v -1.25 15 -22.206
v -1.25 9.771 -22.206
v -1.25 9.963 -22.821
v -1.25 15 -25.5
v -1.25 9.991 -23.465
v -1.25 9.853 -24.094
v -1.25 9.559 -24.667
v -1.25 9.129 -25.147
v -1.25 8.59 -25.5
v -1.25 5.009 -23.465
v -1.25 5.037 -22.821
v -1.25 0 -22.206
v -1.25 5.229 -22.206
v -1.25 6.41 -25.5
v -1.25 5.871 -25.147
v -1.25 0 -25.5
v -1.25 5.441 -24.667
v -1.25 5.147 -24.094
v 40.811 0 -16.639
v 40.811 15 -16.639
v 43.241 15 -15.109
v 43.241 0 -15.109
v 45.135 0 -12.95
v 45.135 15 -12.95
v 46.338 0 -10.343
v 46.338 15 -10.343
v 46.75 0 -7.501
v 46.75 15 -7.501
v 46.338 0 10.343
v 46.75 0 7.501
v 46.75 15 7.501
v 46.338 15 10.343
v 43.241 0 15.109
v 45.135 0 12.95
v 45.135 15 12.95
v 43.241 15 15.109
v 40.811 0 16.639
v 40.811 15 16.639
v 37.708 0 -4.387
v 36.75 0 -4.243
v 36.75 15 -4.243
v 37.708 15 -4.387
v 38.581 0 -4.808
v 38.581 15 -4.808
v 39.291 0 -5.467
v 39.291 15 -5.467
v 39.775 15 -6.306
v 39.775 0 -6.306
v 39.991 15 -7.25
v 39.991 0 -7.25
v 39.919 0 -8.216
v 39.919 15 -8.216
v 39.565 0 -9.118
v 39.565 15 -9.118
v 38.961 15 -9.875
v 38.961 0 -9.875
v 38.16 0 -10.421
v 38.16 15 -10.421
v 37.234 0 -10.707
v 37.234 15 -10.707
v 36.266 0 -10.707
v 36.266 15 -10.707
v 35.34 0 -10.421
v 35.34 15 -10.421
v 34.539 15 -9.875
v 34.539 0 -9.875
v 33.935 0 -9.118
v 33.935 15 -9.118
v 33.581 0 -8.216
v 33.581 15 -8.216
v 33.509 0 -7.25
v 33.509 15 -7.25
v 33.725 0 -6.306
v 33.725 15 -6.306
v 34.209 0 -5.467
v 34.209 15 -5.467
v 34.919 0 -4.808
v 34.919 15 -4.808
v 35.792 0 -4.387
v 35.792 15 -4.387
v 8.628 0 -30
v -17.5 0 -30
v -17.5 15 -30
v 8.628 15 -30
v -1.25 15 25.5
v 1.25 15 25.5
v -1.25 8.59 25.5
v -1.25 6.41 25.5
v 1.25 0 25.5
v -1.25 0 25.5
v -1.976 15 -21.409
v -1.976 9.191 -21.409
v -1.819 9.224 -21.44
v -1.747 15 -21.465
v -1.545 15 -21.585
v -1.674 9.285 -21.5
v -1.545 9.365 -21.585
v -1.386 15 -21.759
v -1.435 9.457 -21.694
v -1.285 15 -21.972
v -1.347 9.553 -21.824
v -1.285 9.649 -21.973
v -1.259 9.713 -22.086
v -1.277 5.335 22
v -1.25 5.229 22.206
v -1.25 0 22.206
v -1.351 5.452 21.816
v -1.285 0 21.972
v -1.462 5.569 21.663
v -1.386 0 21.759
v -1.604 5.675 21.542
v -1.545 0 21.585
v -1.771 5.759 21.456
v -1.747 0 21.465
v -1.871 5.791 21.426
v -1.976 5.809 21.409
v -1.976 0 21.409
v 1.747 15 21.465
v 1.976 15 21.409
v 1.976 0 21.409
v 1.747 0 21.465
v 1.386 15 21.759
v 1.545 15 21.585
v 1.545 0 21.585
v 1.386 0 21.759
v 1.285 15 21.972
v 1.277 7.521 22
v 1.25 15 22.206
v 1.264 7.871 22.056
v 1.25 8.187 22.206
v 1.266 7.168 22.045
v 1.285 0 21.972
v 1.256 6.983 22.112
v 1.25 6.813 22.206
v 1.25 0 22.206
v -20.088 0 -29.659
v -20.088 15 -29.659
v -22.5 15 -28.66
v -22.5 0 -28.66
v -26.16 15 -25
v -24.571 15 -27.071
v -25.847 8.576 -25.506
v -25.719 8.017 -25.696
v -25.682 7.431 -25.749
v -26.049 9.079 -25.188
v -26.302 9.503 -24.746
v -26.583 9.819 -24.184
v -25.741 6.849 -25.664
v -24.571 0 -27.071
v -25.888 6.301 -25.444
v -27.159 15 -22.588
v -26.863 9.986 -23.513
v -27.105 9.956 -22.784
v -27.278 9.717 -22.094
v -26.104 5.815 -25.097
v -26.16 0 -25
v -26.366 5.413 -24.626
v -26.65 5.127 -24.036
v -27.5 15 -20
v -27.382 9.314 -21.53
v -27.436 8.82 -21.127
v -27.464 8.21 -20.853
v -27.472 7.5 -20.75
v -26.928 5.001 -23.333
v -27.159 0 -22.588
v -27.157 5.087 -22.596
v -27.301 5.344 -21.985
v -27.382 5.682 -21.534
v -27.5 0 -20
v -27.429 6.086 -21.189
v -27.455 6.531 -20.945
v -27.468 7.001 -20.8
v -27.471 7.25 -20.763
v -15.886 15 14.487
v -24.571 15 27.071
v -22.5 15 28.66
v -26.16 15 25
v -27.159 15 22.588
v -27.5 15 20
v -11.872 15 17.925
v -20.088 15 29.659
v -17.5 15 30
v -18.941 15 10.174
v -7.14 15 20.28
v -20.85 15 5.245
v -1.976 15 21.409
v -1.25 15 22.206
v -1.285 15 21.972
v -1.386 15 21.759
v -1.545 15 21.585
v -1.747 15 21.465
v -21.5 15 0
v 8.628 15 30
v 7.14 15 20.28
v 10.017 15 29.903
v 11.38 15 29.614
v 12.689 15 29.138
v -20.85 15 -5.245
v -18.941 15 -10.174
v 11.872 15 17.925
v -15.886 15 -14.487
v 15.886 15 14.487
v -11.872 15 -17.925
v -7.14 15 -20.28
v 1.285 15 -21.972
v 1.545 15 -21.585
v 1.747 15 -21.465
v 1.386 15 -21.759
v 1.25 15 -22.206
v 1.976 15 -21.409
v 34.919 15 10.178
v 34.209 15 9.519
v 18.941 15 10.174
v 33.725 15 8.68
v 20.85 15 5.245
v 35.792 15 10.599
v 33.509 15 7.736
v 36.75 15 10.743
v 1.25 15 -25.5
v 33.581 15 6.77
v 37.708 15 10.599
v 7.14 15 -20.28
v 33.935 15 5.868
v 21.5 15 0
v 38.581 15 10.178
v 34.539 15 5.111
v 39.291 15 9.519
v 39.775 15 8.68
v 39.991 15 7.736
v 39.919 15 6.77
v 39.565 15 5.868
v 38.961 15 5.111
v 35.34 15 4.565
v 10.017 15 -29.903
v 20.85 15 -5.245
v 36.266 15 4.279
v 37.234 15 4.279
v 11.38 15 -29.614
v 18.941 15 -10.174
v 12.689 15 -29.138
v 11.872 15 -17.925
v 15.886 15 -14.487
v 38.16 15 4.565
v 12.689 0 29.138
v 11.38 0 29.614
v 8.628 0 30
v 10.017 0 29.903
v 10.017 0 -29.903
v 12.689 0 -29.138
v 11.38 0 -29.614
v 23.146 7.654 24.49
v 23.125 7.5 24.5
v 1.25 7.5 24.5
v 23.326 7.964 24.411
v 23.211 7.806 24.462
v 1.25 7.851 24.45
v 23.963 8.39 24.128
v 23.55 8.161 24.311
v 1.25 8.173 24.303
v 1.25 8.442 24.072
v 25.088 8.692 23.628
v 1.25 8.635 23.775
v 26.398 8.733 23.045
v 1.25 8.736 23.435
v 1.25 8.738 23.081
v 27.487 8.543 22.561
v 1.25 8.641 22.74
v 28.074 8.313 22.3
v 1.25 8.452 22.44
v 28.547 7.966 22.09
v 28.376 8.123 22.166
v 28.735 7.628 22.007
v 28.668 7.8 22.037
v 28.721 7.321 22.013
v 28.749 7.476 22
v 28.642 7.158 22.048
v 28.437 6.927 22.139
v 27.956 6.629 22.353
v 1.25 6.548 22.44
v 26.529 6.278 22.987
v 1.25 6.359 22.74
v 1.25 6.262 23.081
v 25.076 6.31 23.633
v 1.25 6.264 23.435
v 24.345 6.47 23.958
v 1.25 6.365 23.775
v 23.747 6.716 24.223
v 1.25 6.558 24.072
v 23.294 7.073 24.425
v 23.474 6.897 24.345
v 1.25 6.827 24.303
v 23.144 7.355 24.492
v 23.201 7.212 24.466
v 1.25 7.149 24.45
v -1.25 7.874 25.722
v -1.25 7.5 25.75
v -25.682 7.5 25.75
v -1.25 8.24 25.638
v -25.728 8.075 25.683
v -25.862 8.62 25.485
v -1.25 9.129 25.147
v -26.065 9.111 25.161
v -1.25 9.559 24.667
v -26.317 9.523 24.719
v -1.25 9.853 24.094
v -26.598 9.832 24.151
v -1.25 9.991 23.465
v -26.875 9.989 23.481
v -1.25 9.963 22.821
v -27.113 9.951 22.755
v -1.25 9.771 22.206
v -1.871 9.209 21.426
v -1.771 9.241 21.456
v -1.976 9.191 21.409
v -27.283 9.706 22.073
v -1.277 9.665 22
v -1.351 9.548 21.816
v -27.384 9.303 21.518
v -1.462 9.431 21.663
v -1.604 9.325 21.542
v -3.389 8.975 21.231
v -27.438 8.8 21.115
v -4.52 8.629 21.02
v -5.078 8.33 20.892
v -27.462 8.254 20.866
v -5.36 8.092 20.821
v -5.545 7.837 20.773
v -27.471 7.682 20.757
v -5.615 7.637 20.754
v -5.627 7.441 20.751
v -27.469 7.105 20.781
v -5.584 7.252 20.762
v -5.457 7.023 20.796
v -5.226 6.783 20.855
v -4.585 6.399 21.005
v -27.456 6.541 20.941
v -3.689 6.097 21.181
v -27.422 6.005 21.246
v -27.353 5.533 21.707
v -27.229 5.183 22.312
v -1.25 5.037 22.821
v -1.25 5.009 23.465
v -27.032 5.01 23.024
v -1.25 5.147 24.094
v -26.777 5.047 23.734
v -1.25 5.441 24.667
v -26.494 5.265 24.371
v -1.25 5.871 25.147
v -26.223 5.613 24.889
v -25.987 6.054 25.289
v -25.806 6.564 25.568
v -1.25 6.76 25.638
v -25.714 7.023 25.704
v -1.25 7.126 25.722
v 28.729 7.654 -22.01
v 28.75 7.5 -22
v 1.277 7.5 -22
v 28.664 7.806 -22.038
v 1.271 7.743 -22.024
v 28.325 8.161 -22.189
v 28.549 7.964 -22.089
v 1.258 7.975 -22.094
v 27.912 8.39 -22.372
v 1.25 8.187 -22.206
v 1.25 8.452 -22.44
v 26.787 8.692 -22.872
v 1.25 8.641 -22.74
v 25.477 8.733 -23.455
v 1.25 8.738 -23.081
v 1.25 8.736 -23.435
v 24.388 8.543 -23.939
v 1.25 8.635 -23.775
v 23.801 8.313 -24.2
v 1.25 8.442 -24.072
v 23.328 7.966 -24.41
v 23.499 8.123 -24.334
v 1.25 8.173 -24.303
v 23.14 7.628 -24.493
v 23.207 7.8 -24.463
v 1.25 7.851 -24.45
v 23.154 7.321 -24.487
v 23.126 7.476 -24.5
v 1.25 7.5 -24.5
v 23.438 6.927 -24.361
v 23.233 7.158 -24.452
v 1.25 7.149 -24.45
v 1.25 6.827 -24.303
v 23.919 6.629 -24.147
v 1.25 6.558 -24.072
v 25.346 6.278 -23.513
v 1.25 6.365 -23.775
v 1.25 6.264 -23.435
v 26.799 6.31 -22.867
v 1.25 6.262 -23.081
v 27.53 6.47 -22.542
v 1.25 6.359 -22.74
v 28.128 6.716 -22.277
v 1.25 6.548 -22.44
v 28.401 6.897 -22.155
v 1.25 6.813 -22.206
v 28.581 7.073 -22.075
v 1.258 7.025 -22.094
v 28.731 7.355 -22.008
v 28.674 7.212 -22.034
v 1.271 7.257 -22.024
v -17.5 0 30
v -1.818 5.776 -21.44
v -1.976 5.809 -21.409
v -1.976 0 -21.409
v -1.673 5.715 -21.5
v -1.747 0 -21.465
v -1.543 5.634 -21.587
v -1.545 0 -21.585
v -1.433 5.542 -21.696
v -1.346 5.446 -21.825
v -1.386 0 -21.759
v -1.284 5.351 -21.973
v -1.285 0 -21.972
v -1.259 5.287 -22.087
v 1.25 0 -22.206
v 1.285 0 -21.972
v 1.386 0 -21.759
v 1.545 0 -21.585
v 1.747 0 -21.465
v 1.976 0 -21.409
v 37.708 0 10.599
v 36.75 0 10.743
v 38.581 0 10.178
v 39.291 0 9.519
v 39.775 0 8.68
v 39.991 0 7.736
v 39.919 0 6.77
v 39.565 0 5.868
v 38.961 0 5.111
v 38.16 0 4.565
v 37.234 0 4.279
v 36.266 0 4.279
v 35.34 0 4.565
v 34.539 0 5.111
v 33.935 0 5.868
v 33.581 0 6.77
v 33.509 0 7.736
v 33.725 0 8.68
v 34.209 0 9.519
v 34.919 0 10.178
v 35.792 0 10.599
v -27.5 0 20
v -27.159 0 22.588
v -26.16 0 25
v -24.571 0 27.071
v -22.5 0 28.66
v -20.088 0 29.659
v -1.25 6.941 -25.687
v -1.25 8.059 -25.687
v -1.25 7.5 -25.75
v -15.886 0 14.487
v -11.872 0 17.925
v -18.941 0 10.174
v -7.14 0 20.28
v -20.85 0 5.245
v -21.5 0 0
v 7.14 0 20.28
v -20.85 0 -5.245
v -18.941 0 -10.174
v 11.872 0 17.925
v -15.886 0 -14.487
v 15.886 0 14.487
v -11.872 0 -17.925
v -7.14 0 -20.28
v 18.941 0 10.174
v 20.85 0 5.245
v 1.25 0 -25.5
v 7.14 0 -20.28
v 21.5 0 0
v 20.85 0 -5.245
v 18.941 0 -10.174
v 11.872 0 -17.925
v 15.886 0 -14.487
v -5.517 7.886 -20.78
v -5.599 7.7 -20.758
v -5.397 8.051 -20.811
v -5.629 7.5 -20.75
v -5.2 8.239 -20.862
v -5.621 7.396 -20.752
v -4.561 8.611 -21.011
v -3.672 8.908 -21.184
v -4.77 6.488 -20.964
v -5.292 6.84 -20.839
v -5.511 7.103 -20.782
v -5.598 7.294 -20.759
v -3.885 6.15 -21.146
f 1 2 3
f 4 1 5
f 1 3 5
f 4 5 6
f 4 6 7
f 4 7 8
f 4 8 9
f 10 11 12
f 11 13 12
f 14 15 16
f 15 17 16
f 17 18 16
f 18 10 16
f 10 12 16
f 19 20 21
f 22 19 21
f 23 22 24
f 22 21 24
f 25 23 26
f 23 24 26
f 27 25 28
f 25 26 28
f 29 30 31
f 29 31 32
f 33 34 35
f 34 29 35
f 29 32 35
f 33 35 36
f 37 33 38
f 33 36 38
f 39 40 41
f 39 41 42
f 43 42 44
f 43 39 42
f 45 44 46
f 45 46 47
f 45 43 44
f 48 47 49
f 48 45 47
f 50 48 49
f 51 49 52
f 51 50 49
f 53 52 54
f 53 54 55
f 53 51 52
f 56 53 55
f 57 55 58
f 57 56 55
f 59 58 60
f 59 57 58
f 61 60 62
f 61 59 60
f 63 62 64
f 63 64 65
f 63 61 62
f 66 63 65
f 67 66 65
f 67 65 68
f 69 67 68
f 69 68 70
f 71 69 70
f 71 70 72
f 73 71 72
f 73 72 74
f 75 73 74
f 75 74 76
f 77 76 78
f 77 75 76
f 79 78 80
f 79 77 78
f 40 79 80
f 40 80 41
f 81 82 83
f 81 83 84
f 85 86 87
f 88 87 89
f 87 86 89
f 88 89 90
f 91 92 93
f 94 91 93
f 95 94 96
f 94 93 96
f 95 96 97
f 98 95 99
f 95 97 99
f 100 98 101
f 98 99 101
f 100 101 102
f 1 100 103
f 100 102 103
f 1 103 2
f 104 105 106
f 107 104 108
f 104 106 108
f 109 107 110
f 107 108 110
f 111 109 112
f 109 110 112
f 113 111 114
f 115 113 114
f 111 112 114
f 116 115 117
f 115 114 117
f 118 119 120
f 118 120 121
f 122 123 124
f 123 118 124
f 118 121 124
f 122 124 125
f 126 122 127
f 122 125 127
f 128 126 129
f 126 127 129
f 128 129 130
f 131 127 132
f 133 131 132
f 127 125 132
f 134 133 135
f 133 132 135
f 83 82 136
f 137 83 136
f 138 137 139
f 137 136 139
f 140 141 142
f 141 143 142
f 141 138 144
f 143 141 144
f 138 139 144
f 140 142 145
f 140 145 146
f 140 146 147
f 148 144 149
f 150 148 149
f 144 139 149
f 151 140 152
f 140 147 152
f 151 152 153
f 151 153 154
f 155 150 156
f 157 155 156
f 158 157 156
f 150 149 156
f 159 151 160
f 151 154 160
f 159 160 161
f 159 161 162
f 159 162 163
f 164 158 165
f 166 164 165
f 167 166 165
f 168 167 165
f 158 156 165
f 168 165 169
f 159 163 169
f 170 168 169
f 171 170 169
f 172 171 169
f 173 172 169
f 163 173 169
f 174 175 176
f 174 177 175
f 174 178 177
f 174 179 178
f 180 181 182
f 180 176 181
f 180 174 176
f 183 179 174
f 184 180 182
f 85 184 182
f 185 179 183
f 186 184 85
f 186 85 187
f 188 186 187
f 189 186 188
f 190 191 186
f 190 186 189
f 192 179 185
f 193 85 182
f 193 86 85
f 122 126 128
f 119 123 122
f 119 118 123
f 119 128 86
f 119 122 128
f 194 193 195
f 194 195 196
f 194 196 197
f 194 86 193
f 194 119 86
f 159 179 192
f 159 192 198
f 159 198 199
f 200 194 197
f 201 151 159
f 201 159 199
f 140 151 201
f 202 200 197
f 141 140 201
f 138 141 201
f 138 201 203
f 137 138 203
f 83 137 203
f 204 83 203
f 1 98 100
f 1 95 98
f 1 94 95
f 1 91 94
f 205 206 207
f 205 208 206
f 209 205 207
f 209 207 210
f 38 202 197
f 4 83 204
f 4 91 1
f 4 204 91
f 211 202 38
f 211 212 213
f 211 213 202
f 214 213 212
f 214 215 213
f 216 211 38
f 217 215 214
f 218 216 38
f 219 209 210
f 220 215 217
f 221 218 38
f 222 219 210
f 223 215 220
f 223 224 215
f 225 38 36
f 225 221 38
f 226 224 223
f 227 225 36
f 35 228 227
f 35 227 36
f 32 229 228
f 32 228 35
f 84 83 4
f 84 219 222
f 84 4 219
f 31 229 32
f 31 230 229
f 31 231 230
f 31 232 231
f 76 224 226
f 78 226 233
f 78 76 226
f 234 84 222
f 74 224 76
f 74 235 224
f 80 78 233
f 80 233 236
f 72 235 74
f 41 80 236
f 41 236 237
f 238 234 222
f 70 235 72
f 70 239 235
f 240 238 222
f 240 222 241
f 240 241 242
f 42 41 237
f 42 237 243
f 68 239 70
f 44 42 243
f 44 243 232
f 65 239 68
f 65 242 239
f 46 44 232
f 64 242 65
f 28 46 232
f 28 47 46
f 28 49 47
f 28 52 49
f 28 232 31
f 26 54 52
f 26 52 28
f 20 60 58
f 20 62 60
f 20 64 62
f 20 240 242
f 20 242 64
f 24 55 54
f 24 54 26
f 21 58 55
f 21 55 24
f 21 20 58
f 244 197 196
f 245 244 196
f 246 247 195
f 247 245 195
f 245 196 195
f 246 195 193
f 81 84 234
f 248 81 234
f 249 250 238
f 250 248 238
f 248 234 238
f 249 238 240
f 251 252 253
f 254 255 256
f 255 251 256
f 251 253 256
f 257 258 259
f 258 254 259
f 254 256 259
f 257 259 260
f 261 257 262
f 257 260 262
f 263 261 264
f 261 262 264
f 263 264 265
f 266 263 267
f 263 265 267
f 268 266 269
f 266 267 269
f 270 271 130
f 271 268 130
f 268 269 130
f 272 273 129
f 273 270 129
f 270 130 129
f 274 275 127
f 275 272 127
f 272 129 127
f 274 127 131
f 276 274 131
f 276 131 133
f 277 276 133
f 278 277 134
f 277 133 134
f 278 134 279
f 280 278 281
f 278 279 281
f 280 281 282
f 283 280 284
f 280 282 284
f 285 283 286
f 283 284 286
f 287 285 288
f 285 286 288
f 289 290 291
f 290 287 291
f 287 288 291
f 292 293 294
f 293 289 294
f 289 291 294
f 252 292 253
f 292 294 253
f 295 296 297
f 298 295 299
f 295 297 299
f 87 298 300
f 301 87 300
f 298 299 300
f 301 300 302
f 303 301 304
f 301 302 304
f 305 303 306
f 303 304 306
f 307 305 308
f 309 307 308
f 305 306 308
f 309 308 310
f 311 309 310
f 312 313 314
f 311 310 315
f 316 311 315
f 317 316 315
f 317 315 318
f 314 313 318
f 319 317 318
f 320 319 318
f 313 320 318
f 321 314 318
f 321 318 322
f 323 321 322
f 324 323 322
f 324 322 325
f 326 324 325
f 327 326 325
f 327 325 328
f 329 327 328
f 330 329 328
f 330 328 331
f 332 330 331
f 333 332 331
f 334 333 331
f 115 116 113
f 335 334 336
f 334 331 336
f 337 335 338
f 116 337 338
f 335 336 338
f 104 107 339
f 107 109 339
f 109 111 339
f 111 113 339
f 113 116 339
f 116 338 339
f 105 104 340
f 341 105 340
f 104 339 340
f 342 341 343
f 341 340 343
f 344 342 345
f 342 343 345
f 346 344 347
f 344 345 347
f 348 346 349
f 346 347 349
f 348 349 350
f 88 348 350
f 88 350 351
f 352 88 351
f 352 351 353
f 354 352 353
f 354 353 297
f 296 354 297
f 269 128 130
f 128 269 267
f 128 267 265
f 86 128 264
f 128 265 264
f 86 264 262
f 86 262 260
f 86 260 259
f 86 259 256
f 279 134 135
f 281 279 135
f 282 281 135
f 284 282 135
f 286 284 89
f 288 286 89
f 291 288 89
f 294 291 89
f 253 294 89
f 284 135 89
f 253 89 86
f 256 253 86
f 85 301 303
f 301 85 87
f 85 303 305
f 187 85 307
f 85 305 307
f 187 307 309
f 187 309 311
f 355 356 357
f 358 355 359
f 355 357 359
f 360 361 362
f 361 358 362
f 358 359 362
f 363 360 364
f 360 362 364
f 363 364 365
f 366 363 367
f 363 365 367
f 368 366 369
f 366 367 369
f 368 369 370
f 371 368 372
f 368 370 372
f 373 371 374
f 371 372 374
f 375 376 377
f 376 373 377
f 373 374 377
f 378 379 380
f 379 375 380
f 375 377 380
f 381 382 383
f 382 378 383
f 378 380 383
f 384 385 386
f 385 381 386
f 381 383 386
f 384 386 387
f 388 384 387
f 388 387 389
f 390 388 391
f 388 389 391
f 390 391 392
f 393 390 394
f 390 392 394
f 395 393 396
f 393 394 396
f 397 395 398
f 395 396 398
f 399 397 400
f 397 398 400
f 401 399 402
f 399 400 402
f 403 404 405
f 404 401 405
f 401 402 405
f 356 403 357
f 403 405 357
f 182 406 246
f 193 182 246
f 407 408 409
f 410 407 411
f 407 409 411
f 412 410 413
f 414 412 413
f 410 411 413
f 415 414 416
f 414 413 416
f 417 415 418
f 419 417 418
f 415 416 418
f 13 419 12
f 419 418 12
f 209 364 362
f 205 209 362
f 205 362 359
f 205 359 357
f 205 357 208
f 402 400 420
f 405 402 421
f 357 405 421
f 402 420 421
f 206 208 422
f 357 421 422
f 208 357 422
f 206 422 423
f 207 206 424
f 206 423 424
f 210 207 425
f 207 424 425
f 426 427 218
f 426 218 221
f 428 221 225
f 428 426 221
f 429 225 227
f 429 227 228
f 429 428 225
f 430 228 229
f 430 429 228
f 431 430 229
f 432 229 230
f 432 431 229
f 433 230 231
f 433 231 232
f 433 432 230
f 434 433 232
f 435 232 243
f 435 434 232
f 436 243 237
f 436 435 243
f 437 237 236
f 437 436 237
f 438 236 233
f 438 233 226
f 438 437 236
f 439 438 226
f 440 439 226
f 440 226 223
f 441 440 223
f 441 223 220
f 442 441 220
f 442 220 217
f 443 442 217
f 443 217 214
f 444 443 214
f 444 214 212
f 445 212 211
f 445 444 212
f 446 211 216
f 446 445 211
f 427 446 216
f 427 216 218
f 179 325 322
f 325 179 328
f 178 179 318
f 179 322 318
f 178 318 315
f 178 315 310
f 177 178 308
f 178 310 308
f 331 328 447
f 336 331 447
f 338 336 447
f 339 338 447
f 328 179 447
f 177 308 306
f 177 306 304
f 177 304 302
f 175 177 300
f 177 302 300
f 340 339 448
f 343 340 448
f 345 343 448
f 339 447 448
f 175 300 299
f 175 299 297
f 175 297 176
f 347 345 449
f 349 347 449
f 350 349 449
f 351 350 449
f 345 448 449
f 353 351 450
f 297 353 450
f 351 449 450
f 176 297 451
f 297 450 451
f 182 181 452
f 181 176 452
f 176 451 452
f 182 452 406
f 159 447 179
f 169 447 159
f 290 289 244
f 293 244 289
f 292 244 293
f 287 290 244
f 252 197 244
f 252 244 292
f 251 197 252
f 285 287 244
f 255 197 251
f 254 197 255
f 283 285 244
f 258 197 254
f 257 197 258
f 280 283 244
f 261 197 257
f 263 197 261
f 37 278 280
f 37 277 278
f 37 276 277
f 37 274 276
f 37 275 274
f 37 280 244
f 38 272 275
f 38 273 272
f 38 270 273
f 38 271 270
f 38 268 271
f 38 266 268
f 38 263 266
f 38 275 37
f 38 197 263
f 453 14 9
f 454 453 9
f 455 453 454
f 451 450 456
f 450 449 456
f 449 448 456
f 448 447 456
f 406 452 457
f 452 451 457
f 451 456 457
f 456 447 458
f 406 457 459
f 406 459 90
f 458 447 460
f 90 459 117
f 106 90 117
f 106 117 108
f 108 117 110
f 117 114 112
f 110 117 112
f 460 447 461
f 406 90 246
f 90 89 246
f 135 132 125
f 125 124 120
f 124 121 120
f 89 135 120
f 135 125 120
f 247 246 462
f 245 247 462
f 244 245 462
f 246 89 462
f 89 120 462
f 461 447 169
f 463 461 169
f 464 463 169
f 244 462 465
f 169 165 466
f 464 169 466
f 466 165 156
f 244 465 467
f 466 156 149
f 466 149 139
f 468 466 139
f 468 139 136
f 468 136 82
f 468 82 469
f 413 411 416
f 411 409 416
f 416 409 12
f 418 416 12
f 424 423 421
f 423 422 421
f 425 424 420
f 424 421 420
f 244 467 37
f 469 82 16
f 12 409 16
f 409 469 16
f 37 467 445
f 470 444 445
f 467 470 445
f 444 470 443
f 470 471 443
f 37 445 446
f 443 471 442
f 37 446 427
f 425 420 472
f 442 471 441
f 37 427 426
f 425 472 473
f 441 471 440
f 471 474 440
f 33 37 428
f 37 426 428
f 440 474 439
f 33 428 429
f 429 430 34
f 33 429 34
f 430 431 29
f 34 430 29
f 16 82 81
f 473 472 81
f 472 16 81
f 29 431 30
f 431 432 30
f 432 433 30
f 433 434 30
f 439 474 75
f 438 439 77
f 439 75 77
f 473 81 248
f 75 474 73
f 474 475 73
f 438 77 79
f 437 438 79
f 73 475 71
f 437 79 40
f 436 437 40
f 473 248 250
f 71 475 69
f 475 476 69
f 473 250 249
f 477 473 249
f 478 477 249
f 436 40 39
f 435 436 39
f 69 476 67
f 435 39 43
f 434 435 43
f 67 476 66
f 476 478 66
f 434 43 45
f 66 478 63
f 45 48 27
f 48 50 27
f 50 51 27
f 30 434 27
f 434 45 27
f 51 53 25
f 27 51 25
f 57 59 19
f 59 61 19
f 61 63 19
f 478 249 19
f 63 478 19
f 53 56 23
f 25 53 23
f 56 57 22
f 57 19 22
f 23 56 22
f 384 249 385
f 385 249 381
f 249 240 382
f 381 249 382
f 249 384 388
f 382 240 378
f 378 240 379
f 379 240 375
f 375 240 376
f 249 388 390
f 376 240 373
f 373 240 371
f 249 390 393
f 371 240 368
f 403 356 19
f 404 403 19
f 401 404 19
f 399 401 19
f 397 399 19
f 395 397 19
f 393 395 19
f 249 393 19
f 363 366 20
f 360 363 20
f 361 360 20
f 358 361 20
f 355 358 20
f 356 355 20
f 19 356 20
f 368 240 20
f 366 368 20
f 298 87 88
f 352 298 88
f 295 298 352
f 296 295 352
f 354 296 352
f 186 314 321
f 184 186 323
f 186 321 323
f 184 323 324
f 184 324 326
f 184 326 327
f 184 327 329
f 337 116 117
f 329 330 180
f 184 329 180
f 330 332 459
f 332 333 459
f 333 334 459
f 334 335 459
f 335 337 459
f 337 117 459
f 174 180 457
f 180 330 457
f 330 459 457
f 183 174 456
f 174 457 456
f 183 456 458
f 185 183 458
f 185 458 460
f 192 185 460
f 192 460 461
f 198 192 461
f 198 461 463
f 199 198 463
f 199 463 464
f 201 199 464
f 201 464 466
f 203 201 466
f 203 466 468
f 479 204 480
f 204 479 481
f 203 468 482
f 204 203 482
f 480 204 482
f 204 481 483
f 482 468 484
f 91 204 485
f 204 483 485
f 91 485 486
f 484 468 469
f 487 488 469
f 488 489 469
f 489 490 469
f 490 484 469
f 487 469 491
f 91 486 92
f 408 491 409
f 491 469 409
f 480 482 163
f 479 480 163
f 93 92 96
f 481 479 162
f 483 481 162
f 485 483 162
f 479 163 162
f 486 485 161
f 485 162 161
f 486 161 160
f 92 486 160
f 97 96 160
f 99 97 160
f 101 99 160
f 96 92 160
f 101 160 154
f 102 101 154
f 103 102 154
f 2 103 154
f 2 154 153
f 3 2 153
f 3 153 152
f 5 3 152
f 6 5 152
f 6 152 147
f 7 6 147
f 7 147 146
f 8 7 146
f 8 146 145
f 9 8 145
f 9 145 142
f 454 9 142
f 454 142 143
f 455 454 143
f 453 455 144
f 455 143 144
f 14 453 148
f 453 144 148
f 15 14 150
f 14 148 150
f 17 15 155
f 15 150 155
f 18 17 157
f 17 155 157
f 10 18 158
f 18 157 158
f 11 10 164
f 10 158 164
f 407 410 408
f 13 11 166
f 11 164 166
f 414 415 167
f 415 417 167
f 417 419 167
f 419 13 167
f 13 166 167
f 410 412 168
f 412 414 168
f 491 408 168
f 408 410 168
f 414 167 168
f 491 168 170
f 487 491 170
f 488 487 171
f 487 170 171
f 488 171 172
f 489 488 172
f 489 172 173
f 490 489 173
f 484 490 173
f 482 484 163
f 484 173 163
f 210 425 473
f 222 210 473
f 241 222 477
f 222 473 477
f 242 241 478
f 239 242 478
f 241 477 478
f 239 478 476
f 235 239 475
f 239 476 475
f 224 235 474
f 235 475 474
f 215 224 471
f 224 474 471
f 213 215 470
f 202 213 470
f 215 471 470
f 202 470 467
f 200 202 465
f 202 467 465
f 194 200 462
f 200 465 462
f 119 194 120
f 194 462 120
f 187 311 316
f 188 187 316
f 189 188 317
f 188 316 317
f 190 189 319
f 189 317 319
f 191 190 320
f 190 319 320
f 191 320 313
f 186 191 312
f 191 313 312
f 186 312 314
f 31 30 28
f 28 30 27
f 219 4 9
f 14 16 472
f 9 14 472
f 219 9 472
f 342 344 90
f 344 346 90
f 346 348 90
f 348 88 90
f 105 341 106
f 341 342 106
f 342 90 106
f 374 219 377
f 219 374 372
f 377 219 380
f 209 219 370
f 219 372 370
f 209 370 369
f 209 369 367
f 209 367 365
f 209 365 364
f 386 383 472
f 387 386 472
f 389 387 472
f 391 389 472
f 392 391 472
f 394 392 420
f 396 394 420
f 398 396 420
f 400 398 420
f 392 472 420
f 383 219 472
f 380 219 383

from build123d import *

# Parameters (mm, degrees)
SKETCH1_W           = 74.25
SKETCH1_H           = 60
SKETCH1_R           = 3.25
BOSS_EXTRUDE1_DEPTH = 15
SKETCH2_R           = 1.25
CUT_EXTRUDE1_DEPTH  = 82.474305766
CUT_EXTRUDE2_REACH  = 83.474
SKETCH3_R           = 2.5
CUT_EXTRUDE3_DEPTH  = 58.537487806
FILLET1_R           = 10
FILLET2_R           = 0.8


with BuildPart() as part:
    # Sketch1 → Boss-Extrude1 (new body)
    with BuildSketch(Plane(origin=(0, 0, 0), x_dir=(1, 0, 0), z_dir=(0, 1, 0))):
        with Locations((9.625, 0)):
            Rectangle(SKETCH1_W, SKETCH1_H)
        with Locations(Location((36.75, 7.493, 0), (0, 0, 270))):
            Circle(SKETCH1_R, mode=Mode.SUBTRACT)
        with Locations(Location((36.75, -7.493, 0), (0, 0, 270))):
            Circle(SKETCH1_R, mode=Mode.SUBTRACT)
        with BuildLine():
            Line((-1.25, 21.463632032), (-1.25, 25.5))
            Line((-1.25, 25.5), (1.25, 25.5))
            Line((1.25, 25.5), (1.25, 21.463632032))
            ThreePointArc((1.25, 21.463632032), (21.5, 0), (1.25, -21.463632032))
            Line((1.25, -21.463632032), (1.25, -25.5))
            Line((1.25, -25.5), (-1.25, -25.5))
            Line((-1.25, -25.5), (-1.25, -21.463632032))
            ThreePointArc((-1.25, -21.463632032), (-21.5, 0), (-1.25, 21.463632032))
        make_face(mode=Mode.SUBTRACT)
    extrude(amount=BOSS_EXTRUDE1_DEPTH)

    # Sketch2 → Cut-Extrude1 (cut, through all)
    with BuildSketch(Plane.ZY.offset(27.5)):
        with Locations((-23.25, 7.5)):
            Circle(SKETCH2_R)
        with Locations((23.25, 7.5)):
            Circle(SKETCH2_R)
    extrude(amount=-CUT_EXTRUDE1_DEPTH, mode=Mode.SUBTRACT)

    # Cut-Extrude2: up to this face of the body (flat: up to its plane)
    cut_extrude2_end = Plane(part.part.faces().sort_by_distance((-1.25, 7.5, -21.618967883))[0])
    # Sketch3 → Cut-Extrude2 (cut, up to the picked face)
    with BuildSketch(Plane.ZY.offset(27.5), mode=Mode.PRIVATE) as cut_extrude2_sk1:
        with Locations((-23.25, 7.5)):
            Circle(SKETCH3_R)
    cut_extrude2_tool1 = split(extrude(cut_extrude2_sk1.sketch, amount=-CUT_EXTRUDE2_REACH, mode=Mode.PRIVATE), bisect_by=cut_extrude2_end, keep=Keep.BOTH, mode=Mode.PRIVATE)
    # Sketch3 → Cut-Extrude2 (cut, up to the picked face)
    with BuildSketch(Plane.ZY.offset(27.5), mode=Mode.PRIVATE) as cut_extrude2_sk2:
        with Locations((23.25, 7.5)):
            Circle(SKETCH3_R)
    cut_extrude2_tool2 = split(extrude(cut_extrude2_sk2.sketch, amount=-CUT_EXTRUDE2_REACH, mode=Mode.PRIVATE), bisect_by=cut_extrude2_end, keep=Keep.BOTH, mode=Mode.PRIVATE)
    add(cut_extrude2_tool1.solids().sort_by(Axis((-27.5, 7.5, -23.25), (1, 0, 0)))[0], mode=Mode.SUBTRACT)
    add(cut_extrude2_tool2.solids().sort_by(Axis((-27.5, 7.5, 23.25), (1, 0, 0)))[0], mode=Mode.SUBTRACT)

    # Sketch4 → Cut-Extrude3 (cut, through all)
    with BuildSketch(Plane(origin=(0, 15, 0), x_dir=(1, 0, 0), z_dir=(0, 1, 0))):
        Polygon((10.75, -30), (46.75, -14), (46.75, -30), align=None)
    cut_extrude3 = extrude(amount=-CUT_EXTRUDE3_DEPTH, mode=Mode.SUBTRACT)

    # Mirror1: Cut-Extrude3 across plane
    add(cut_extrude3.mirror(Plane.XY), mode=Mode.SUBTRACT)

    # Fillet1
    # the kernel refuses this fillet: 10 mm, written as the material it takes off along each edge
    with BuildSketch(Plane(origin=(46.75, 31.246827227, -14), x_dir=(-0.9138115486202572, 0, -0.4061384660534477), z_dir=(0, -1, 0))) as fillet1_piece_1:
        with BuildLine():
            CenterArc((FILLET1_R * 0.649873089088, -FILLET1_R), FILLET1_R, 90, 66.037511025)
            Line((-FILLET1_R * 0.263938459532, -FILLET1_R * 0.593861533947), (0, 0))
            Line((0, 0), (FILLET1_R * 0.649873089088, 0))
        make_face()
    extrude(amount=47.493654454, mode=Mode.SUBTRACT)
    with BuildSketch(Plane(origin=(10.75, 20.305361261, -30), x_dir=(-1, 0, 0), z_dir=(0, -1, 0)), Plane(origin=(10.75, 20.305361261, 30), x_dir=(0.9138115486202572, 0, -0.4061384660534476), z_dir=(0, -1, 0))) as fillet1_piece_2:
        with BuildLine():
            CenterArc((FILLET1_R * 0.212214450449, -FILLET1_R), FILLET1_R, 90, 23.962488975)
            Line((-FILLET1_R * 0.193924015604, -FILLET1_R * 0.0861884513797), (0, 0))
            Line((0, 0), (FILLET1_R * 0.212214450449, 0))
        make_face()
    extrude(amount=25.610722522, mode=Mode.SUBTRACT)
    with BuildSketch(Plane(origin=(-27.5, -25, 30), x_dir=(0, 0, -1), z_dir=(0, 1, 0)), Plane(origin=(-27.5, -25, -30), x_dir=(1, 0, 0), z_dir=(0, 1, 0))) as fillet1_piece_3:
        with BuildLine():
            CenterArc((FILLET1_R, -FILLET1_R), FILLET1_R, 90, 90)
            Line((0, -FILLET1_R), (0, 0))
            Line((0, 0), (FILLET1_R, 0))
        make_face()
    extrude(amount=65, mode=Mode.SUBTRACT)
    with BuildSketch(Plane(origin=(46.75, 31.246827227, 14), x_dir=(-0.9138115486202572, 0, 0.4061384660534477), z_dir=(0, -1, 0))) as fillet1_piece_4:
        with BuildLine():
            CenterArc((FILLET1_R * 0.649873089088, FILLET1_R), FILLET1_R, 203.962488975, 66.037511025)
            Line((-FILLET1_R * 0.263938459532, FILLET1_R * 0.593861533947), (0, 0))
            Line((0, 0), (FILLET1_R * 0.649873089088, 0))
        make_face()
    extrude(amount=47.493654454, mode=Mode.SUBTRACT)

    # Fillet2
    # the kernel refuses this fillet: 0.8 mm, written as the material it takes off along each edge
    with BuildSketch(Plane(origin=(1.25, -1.854853982, 21.463632032), x_dir=(0.9971801734895888, 0, -0.07504466402932025), z_dir=(0, 1, 0))) as fillet2_piece_1:
        with BuildLine():
            CenterArc((0.742065381, -0.799885177), FILLET2_R, 90.970759103, 84.725452299)
            Line((-0.055678758, -0.739849446), (0, 0))
            ThreePointArc((0, 0), (0.364255838, -0.003085857), (0.728511676, 0))
        make_face()
    extrude(amount=18.709707964, mode=Mode.SUBTRACT)
    with BuildSketch(Plane(origin=(-1.25, -1.854853982, 21.463632032), x_dir=(-0.9971801734895881, 0, -0.07504466402932955), z_dir=(0, 1, 0)), Plane(origin=(-1.25, 7.394114137, 21.463632032), x_dir=(-0.9971801734895881, 0, -0.07504466402932955), z_dir=(0, 1, 0))) as fillet2_piece_2:
        with BuildLine():
            CenterArc((0.742065381, 0.799885177), FILLET2_R, 184.303788597, 84.725452299)
            Line((-0.055678758, 0.739849446), (0, 0))
            ThreePointArc((0, 0), (0.364255838, 0.003085857), (0.728511676, 0))
        make_face()
    extrude(amount=9.460739845, mode=Mode.SUBTRACT)
    with BuildSketch(Plane(origin=(-1.25, 7.394114137, -21.463632032), x_dir=(-0.9971801734895888, 0, 0.07504466402932025), z_dir=(0, 1, 0))) as fillet2_piece_3:
        with BuildLine():
            CenterArc((0.742065381, -0.799885177), FILLET2_R, 90.970759103, 84.725452299)
            Line((-0.055678758, -0.739849446), (0, 0))
            ThreePointArc((0, 0), (0.364255838, -0.003085857), (0.728511676, 0))
        make_face()
    extrude(amount=9.460739845, mode=Mode.SUBTRACT)
    with BuildSketch(Plane(origin=(-1.25, -1.854853982, -21.463632032), x_dir=(0, 0, -1), z_dir=(0, 1, 0))) as fillet2_piece_4:
        with BuildLine():
            CenterArc((0.741941593, 0.8), FILLET2_R, 185.274547701, 84.725452299)
            ThreePointArc((-0.054670914, 0.726457399), (-0.024258302, 0.363460277), (0, 0))
            Line((0, 0), (0.741941593, 0))
        make_face()
    extrude(amount=9.460739845, mode=Mode.SUBTRACT)
    with BuildSketch(Plane(origin=(1.25, -1.854853982, -21.463632032), x_dir=(0, 0, -1), z_dir=(0, 1, 0))) as fillet2_piece_5:
        with BuildLine():
            CenterArc((0.741941593, -0.8), FILLET2_R, 90, 84.725452299)
            ThreePointArc((-0.054670914, -0.726457399), (-0.024258302, -0.363460277), (0, 0))
            Line((0, 0), (0.741941593, 0))
        make_face()
    extrude(amount=18.709707964, mode=Mode.SUBTRACT)


solid = part.part
